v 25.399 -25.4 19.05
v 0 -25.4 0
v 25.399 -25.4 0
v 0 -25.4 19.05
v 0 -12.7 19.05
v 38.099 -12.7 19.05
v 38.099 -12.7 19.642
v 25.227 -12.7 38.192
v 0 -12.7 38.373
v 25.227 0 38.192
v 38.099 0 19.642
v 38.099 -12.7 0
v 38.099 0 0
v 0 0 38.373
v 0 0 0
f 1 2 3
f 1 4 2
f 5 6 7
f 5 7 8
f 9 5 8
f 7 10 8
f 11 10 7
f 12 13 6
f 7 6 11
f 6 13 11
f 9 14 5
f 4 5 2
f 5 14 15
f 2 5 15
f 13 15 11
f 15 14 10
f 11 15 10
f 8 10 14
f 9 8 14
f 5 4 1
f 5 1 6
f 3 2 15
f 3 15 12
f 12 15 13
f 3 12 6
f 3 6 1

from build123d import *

# Parameters (mm, degrees)
F1_DEPTH = 25.4
F3_DEPTH = 38.100021
F5_DEPTH = 25.401
F7_DEPTH = 19.051


with BuildPart() as f1:
    # F0 (on Front) → F1 (new body)
    with BuildSketch(Plane.XZ):
        Polygon((38.099021, 38.1), (0, 38.373113), (0, 0), (38.099021, 0), align=None)
    extrude(amount=F1_DEPTH)

    # F2 (on Right) → F3 (cut, through all)
    with BuildSketch(Plane.YZ):
        Polygon((-12.7, 19.05), (-12.7, 38.488368), (-25.474755, 38.488368), (-25.453678, 19.05), align=None)
    extrude(amount=F3_DEPTH, mode=Mode.SUBTRACT)

    # F4 (on Front) → F5 (cut, through all)
    with BuildSketch(Plane.XZ):
        Polygon((38.132016, 38.228069), (25.06916, 38.420167), (38.132016, 19.594286), align=None)
    extrude(amount=F5_DEPTH, mode=Mode.SUBTRACT)

    # F6 (on face) → F7 (cut, through all)
    with BuildSketch(Plane.XY.offset(19.05)):
        Polygon((38.099021, -25.4), (38.099021, -12.7), (25.399021, -25.4), align=None)
    extrude(amount=-F7_DEPTH, mode=Mode.SUBTRACT)


solid = f1.part
